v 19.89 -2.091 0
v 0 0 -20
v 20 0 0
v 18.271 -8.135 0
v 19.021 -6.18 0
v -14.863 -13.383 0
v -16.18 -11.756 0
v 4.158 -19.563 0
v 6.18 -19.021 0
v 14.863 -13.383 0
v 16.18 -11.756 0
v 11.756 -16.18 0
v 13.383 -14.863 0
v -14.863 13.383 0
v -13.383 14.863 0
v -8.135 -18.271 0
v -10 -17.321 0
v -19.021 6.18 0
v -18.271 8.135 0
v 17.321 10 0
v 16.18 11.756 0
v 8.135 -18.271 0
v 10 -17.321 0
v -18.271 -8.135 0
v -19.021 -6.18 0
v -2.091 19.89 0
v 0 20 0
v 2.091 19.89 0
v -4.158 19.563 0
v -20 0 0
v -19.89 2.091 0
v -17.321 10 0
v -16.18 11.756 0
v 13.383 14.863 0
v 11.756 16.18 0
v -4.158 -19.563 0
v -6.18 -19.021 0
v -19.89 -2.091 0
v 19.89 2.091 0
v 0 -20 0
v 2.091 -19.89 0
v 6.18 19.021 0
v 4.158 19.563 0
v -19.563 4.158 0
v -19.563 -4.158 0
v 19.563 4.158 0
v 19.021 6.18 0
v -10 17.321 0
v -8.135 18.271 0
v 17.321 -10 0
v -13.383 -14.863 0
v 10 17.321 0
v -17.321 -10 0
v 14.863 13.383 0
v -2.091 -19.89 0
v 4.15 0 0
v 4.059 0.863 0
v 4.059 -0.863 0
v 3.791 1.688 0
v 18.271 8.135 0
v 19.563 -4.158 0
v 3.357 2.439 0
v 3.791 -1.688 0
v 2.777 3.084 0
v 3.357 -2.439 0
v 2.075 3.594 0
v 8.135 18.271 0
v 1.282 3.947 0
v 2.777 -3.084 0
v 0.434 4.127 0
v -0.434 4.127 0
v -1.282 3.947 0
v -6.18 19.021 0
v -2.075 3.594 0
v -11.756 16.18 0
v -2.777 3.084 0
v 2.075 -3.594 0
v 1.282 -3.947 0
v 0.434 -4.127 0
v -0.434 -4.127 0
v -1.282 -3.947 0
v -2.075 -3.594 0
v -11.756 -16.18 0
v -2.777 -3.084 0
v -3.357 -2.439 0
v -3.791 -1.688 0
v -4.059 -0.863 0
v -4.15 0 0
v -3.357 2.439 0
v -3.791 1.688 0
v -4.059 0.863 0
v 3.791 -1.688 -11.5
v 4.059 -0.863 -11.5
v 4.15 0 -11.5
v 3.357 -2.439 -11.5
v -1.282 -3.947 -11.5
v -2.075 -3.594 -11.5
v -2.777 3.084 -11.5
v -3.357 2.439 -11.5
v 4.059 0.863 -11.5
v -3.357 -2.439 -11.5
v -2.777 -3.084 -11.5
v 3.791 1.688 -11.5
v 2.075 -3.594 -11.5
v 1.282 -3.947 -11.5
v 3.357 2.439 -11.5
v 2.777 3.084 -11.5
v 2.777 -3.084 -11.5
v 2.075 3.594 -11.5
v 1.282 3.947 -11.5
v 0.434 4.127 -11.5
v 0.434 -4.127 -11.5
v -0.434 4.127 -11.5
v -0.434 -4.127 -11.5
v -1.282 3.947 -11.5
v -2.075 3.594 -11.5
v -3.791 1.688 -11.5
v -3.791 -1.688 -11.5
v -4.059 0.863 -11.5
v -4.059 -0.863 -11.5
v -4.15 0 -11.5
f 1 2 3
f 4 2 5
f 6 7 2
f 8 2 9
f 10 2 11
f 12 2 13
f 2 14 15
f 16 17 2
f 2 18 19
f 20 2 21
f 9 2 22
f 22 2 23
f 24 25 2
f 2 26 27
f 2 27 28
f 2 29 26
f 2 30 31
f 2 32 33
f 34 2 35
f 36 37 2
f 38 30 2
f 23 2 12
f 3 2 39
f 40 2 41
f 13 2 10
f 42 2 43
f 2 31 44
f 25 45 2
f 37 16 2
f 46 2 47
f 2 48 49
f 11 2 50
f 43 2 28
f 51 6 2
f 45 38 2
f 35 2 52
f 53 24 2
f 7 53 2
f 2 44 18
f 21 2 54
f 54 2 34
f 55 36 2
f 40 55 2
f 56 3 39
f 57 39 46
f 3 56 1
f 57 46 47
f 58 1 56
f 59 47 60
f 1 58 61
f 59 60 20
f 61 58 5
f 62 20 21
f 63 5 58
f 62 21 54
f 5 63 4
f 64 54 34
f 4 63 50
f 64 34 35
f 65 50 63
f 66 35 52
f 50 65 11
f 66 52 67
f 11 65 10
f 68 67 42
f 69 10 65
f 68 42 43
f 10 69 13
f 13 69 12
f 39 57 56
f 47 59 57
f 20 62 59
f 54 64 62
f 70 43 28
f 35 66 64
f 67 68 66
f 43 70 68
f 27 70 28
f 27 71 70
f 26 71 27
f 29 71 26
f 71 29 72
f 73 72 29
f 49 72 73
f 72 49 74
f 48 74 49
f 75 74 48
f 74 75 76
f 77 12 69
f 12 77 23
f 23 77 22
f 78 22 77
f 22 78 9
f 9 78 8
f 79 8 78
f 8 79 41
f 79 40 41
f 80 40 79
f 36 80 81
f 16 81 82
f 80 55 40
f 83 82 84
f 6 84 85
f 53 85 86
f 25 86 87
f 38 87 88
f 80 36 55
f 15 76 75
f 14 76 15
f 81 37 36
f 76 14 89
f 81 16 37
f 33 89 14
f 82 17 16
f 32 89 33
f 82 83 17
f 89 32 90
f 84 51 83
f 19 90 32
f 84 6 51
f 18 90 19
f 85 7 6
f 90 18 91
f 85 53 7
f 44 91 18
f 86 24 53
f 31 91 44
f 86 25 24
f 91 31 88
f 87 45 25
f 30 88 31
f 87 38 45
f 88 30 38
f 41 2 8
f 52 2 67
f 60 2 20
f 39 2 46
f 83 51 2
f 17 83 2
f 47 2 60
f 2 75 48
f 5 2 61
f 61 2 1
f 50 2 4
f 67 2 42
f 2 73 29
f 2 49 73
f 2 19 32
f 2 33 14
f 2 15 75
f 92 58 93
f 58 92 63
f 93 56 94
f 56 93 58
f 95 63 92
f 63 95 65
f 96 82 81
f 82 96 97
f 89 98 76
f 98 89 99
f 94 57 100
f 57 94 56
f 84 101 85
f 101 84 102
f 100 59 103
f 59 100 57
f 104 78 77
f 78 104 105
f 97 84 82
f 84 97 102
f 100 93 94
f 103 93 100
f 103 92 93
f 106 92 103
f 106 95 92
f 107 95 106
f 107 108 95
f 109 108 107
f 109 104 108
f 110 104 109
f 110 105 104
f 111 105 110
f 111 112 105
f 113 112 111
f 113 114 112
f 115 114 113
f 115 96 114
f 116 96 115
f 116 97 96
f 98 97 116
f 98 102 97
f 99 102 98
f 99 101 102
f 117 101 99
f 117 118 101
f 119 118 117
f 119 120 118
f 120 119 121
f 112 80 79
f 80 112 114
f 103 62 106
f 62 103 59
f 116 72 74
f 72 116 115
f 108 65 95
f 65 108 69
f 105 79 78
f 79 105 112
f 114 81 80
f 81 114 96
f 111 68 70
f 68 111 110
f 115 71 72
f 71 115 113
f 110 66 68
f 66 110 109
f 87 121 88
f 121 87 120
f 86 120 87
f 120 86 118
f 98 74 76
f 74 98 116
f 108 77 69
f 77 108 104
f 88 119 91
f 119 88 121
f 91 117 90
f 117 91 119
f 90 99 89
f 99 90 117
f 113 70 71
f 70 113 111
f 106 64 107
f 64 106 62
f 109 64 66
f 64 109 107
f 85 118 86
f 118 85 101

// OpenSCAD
use <carousel.scad>
// Print upside-down (point on bed)
rotate([180, 0, 0]) canopy();
